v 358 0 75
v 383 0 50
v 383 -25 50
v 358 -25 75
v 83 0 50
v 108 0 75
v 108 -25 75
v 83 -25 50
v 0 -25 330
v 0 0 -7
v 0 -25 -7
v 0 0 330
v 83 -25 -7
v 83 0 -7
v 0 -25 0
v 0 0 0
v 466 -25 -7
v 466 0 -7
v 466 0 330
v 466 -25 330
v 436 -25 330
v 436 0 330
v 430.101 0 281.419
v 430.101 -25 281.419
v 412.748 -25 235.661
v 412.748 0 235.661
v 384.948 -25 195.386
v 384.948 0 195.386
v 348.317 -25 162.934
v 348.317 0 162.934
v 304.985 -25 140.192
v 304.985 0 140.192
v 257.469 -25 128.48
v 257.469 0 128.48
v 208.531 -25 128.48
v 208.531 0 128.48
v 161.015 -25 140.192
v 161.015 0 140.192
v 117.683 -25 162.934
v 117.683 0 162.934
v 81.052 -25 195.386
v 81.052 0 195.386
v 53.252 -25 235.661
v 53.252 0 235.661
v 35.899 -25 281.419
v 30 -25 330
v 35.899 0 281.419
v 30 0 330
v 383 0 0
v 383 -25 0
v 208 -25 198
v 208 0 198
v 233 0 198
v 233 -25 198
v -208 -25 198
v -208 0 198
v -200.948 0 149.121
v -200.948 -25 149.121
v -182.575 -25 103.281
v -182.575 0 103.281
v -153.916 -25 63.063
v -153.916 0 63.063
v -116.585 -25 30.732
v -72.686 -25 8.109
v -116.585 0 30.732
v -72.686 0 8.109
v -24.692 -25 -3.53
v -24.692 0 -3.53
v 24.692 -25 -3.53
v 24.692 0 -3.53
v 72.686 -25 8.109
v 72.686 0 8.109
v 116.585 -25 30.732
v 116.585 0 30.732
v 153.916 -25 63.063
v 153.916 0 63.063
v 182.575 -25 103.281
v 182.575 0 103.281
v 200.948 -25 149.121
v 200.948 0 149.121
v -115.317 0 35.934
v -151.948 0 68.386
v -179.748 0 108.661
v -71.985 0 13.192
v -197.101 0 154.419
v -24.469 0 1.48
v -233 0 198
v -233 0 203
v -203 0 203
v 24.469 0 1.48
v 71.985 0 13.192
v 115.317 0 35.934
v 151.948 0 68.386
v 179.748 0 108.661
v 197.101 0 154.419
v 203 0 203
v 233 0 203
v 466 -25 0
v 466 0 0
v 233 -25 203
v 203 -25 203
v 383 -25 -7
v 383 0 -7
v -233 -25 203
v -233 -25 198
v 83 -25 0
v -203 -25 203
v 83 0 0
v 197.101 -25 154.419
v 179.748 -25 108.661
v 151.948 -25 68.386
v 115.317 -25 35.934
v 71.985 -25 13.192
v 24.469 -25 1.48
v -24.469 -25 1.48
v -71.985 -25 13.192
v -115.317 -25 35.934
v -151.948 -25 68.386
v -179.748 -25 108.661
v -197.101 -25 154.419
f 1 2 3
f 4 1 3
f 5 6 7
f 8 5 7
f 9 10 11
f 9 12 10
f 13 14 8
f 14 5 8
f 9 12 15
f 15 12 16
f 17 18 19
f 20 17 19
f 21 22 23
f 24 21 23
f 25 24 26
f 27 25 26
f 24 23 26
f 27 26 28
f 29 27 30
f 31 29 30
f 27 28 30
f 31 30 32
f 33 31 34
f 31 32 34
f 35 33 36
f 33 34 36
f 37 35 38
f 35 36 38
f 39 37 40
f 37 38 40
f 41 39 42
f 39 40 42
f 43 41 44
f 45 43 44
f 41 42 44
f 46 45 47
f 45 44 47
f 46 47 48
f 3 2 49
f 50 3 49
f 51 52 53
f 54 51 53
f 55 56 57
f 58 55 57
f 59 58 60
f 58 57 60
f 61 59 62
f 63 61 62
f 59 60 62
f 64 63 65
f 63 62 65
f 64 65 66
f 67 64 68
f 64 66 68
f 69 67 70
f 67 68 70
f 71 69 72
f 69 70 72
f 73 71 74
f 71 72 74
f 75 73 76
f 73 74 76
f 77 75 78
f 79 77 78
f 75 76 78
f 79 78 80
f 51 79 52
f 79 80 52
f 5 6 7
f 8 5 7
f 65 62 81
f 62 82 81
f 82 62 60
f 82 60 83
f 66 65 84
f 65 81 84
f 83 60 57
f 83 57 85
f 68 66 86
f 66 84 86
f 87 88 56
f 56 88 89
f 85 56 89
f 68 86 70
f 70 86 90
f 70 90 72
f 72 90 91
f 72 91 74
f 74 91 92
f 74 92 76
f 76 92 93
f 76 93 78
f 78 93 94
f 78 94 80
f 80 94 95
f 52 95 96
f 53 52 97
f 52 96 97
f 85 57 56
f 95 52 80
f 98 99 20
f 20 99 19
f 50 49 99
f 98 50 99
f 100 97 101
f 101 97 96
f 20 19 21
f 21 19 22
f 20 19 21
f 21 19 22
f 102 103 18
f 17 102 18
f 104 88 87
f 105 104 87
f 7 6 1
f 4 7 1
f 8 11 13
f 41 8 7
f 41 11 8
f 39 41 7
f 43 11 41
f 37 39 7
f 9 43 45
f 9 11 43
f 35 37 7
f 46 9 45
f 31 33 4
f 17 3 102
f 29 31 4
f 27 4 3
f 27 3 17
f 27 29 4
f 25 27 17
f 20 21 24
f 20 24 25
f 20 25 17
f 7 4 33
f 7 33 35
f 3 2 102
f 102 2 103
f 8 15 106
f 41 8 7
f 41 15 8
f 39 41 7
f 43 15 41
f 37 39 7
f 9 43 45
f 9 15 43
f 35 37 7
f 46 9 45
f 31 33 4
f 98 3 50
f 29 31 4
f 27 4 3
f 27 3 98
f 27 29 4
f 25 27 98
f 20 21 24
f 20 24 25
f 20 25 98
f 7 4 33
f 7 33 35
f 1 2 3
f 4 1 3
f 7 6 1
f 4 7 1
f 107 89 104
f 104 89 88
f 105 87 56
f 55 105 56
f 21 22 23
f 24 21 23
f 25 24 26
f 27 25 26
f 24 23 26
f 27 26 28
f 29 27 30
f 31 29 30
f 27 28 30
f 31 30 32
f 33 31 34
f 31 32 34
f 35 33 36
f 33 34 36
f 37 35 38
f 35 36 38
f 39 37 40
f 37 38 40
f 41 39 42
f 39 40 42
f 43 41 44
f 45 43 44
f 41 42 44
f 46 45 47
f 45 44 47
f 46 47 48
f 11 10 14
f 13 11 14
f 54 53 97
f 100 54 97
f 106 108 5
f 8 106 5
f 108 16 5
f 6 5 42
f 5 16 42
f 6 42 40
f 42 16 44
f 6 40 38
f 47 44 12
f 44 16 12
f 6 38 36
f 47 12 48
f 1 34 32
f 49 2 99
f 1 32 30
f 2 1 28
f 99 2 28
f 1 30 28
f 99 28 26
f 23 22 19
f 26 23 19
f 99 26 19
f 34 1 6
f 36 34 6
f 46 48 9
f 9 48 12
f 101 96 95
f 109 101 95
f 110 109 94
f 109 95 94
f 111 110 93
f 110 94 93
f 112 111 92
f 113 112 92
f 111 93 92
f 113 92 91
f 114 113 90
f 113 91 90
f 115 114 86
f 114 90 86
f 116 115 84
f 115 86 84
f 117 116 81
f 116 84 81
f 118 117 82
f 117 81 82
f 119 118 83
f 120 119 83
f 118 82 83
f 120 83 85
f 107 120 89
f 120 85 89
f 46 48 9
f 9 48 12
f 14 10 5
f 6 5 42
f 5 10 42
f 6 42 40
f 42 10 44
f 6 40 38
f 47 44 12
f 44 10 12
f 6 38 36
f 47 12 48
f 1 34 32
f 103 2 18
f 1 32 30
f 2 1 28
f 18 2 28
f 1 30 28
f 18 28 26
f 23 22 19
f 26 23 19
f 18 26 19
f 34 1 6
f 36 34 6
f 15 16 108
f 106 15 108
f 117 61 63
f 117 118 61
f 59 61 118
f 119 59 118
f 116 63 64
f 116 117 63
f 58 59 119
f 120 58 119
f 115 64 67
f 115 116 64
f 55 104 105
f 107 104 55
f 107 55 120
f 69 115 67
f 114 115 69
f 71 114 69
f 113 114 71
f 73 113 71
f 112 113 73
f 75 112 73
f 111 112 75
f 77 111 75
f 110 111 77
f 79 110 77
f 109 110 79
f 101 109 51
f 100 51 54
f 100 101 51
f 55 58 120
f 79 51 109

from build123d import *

# Parameters (mm, degrees)
F1_DEPTH = 25
F2_SIZE  = 25
F3_DEPTH = 25
F4_SIZE  = 25
F5_DEPTH = 7
F7_DEPTH = 25


with BuildPart() as f1:
    # F0 (on Front) → F1 (new body)
    with BuildSketch(Plane.XZ):
        with BuildLine():
            Line((0, 330), (0, 0))
            Line((0, 0), (83, 0))
            Line((83, 0), (83, 75))
            Line((83, 75), (383, 75))
            Line((383, 75), (383, 0))
            Line((383, 0), (466, 0))
            Line((466, 0), (466, 330))
            Line((466, 330), (436, 330))
            ThreePointArc((436, 330), (233, 127), (30, 330))
            Line((30, 330), (0, 330))
        make_face()
    extrude(amount=F1_DEPTH)

    # F2
    f2_edges = [f1.edges().sort_by_distance(p)[0] for p in [
        (83, -12.5, 75),
        (383, -12.5, 75),
    ]]
    chamfer(f2_edges, length=F2_SIZE)


with BuildPart() as f3:
    # F0 (on Front) → F3 (new body)
    with BuildSketch(Plane.XZ):
        with BuildLine():
            Line((0, 330), (0, 0))
            Line((0, 0), (83, 0))
            Line((83, 0), (83, 75))
            Line((83, 75), (383, 75))
            Line((383, 75), (383, 0))
            Line((383, 0), (466, 0))
            Line((466, 0), (466, 330))
            Line((466, 330), (436, 330))
            ThreePointArc((436, 330), (233, 127), (30, 330))
            Line((30, 330), (0, 330))
        make_face()
    extrude(amount=F3_DEPTH)

    # F4
    f4_edges = [f3.edges().sort_by_distance(p)[0] for p in [
        (83, -12.5, 75),
        (383, -12.5, 75),
    ]]
    chamfer(f4_edges, length=F4_SIZE)

    # F5 (add): faces of the model
    f5_faces = [f3.faces().sort_by_distance(p)[0] for p in [
        (41.5, -12.5, 0),
        (424.5, -12.5, 0),
    ]]
    extrude(f5_faces, amount=F5_DEPTH)


with BuildPart() as f7:
    # F6 (on Front) → F7 (new body)
    with BuildSketch(Plane.XZ):
        with BuildLine():
            Line((-233, 203), (-233, 198))
            Line((-233, 198), (-208, 198))
            ThreePointArc((-208, 198), (0, -5), (208, 198))
            Line((208, 198), (233, 198))
            Line((233, 198), (233, 203))
            Line((233, 203), (203, 203))
            ThreePointArc((203, 203), (0, 0), (-203, 203))
            Line((-203, 203), (-233, 203))
        make_face()
    extrude(amount=F7_DEPTH)


solid = Compound([f1.part, f3.part, f7.part])
